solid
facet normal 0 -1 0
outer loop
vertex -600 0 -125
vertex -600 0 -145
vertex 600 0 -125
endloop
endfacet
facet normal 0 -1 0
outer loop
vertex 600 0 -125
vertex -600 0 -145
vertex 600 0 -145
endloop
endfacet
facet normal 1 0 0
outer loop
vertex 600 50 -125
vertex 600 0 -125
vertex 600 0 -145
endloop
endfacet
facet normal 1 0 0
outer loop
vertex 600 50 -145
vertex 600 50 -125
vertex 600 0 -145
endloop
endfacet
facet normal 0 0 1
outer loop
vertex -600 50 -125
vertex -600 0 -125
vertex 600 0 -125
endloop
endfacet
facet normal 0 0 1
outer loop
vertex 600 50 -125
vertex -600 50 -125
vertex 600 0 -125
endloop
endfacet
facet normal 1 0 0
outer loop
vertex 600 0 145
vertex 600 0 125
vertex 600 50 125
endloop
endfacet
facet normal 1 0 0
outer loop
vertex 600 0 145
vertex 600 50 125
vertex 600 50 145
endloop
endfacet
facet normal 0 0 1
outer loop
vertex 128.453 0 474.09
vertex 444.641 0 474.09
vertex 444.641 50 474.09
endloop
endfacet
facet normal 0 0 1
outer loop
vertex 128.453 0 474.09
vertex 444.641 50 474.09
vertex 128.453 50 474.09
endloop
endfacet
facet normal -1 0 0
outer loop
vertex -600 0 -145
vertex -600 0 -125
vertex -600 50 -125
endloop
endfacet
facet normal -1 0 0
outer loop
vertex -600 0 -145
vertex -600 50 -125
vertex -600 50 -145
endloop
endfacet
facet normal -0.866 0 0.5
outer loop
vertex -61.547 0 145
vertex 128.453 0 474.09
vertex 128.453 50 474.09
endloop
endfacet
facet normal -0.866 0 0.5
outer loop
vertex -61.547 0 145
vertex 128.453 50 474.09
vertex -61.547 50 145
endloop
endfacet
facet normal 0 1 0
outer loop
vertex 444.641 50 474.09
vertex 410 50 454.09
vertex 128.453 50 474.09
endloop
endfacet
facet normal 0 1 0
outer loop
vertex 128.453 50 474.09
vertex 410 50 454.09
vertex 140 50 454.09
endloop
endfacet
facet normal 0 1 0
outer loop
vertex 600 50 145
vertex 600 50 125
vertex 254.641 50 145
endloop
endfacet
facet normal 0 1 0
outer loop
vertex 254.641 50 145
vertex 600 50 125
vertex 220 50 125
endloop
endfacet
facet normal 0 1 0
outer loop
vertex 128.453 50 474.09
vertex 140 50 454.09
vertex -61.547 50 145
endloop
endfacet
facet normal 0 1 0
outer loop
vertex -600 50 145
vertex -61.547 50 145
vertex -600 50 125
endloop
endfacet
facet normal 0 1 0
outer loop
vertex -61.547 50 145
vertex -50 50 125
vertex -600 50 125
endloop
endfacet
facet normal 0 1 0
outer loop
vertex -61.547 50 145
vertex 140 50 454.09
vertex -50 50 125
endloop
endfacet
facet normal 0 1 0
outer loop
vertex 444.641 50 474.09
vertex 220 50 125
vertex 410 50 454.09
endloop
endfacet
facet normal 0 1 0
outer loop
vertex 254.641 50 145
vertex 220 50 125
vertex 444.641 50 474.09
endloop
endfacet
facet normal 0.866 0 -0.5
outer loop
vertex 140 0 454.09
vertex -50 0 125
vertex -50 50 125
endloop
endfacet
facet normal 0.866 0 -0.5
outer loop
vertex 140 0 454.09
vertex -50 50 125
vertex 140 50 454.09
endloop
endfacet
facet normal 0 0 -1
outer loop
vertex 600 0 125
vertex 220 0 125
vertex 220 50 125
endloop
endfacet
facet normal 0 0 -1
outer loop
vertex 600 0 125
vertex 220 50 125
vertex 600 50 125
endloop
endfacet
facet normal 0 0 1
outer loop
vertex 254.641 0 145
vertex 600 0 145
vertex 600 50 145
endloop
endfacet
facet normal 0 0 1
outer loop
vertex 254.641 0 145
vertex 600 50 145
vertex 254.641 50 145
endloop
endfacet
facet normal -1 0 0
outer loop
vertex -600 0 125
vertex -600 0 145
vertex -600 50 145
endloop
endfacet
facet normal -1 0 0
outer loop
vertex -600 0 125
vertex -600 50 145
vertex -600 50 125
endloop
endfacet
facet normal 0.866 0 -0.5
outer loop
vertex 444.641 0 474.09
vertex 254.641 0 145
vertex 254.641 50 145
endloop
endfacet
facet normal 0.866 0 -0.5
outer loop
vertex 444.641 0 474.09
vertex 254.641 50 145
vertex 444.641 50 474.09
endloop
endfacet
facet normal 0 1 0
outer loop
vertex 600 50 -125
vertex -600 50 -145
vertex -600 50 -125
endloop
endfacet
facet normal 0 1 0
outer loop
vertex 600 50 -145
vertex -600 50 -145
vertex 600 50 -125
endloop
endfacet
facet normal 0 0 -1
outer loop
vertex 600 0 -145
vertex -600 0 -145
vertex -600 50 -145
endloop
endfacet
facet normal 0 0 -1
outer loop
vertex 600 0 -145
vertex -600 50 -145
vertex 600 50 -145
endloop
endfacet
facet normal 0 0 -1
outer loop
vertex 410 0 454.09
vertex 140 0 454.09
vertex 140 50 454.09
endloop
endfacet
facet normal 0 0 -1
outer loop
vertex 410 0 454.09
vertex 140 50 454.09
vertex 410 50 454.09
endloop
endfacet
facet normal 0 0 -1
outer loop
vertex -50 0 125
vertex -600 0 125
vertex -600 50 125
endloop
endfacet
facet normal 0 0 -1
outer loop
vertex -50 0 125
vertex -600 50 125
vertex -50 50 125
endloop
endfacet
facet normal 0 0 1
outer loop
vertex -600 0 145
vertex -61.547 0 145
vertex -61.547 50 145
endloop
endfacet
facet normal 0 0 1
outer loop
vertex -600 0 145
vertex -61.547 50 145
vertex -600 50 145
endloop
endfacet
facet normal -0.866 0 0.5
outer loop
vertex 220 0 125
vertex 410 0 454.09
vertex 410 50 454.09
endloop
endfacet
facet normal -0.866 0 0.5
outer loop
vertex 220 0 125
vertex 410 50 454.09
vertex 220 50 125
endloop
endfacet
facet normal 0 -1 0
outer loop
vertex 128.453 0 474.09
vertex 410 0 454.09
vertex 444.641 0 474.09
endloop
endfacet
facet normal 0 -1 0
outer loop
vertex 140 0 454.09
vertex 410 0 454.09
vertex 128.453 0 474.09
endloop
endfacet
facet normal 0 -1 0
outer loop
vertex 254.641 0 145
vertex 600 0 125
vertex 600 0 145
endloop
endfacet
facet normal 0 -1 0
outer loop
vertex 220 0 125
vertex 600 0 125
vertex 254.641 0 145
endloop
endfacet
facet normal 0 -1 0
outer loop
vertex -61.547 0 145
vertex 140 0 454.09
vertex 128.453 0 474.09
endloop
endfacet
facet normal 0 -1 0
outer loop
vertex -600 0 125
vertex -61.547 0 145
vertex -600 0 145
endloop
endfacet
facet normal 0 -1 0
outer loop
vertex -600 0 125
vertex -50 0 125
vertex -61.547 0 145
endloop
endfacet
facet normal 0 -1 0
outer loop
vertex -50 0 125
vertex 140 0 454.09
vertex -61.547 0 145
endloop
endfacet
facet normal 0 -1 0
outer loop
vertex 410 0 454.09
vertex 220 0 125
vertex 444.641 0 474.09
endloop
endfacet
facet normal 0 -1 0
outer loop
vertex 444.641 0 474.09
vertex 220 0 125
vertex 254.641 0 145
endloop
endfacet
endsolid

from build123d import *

# Parameters (mm, degrees)
EXTRUDE_1_DEPTH   = 50
SKETCH_1_W        = 1200
SKETCH_1_H        = 20
EXTRUDE_1_2_DEPTH = 50


with BuildPart() as part:
    # 草图1 → 凸台-拉伸1 (new body)
    with BuildSketch(Plane(origin=(0, 0, 0), x_dir=(1, 0, 0), z_dir=(0, 1, 0))):
        Polygon((-50, -125), (140, -454.089653438), (410, -454.089653438), (220, -125), (600, -125), (600, -145), (254.641016151, -145), (444.641016151, -474.089653438), (128.452994616, -474.089653438), (-61.547005384, -145), (-600, -145), (-600, -125), align=None)
    extrude(amount=EXTRUDE_1_DEPTH)


with BuildPart() as body_2:
    # 草图1 → Extrude 1 2 (new body)
    with BuildSketch(Plane(origin=(0, 0, 0), x_dir=(1, 0, 0), z_dir=(0, 1, 0))):
        with Locations((0, 135)):
            Rectangle(SKETCH_1_W, SKETCH_1_H)
    extrude(amount=EXTRUDE_1_2_DEPTH)


solid = Compound([part.part, body_2.part])
